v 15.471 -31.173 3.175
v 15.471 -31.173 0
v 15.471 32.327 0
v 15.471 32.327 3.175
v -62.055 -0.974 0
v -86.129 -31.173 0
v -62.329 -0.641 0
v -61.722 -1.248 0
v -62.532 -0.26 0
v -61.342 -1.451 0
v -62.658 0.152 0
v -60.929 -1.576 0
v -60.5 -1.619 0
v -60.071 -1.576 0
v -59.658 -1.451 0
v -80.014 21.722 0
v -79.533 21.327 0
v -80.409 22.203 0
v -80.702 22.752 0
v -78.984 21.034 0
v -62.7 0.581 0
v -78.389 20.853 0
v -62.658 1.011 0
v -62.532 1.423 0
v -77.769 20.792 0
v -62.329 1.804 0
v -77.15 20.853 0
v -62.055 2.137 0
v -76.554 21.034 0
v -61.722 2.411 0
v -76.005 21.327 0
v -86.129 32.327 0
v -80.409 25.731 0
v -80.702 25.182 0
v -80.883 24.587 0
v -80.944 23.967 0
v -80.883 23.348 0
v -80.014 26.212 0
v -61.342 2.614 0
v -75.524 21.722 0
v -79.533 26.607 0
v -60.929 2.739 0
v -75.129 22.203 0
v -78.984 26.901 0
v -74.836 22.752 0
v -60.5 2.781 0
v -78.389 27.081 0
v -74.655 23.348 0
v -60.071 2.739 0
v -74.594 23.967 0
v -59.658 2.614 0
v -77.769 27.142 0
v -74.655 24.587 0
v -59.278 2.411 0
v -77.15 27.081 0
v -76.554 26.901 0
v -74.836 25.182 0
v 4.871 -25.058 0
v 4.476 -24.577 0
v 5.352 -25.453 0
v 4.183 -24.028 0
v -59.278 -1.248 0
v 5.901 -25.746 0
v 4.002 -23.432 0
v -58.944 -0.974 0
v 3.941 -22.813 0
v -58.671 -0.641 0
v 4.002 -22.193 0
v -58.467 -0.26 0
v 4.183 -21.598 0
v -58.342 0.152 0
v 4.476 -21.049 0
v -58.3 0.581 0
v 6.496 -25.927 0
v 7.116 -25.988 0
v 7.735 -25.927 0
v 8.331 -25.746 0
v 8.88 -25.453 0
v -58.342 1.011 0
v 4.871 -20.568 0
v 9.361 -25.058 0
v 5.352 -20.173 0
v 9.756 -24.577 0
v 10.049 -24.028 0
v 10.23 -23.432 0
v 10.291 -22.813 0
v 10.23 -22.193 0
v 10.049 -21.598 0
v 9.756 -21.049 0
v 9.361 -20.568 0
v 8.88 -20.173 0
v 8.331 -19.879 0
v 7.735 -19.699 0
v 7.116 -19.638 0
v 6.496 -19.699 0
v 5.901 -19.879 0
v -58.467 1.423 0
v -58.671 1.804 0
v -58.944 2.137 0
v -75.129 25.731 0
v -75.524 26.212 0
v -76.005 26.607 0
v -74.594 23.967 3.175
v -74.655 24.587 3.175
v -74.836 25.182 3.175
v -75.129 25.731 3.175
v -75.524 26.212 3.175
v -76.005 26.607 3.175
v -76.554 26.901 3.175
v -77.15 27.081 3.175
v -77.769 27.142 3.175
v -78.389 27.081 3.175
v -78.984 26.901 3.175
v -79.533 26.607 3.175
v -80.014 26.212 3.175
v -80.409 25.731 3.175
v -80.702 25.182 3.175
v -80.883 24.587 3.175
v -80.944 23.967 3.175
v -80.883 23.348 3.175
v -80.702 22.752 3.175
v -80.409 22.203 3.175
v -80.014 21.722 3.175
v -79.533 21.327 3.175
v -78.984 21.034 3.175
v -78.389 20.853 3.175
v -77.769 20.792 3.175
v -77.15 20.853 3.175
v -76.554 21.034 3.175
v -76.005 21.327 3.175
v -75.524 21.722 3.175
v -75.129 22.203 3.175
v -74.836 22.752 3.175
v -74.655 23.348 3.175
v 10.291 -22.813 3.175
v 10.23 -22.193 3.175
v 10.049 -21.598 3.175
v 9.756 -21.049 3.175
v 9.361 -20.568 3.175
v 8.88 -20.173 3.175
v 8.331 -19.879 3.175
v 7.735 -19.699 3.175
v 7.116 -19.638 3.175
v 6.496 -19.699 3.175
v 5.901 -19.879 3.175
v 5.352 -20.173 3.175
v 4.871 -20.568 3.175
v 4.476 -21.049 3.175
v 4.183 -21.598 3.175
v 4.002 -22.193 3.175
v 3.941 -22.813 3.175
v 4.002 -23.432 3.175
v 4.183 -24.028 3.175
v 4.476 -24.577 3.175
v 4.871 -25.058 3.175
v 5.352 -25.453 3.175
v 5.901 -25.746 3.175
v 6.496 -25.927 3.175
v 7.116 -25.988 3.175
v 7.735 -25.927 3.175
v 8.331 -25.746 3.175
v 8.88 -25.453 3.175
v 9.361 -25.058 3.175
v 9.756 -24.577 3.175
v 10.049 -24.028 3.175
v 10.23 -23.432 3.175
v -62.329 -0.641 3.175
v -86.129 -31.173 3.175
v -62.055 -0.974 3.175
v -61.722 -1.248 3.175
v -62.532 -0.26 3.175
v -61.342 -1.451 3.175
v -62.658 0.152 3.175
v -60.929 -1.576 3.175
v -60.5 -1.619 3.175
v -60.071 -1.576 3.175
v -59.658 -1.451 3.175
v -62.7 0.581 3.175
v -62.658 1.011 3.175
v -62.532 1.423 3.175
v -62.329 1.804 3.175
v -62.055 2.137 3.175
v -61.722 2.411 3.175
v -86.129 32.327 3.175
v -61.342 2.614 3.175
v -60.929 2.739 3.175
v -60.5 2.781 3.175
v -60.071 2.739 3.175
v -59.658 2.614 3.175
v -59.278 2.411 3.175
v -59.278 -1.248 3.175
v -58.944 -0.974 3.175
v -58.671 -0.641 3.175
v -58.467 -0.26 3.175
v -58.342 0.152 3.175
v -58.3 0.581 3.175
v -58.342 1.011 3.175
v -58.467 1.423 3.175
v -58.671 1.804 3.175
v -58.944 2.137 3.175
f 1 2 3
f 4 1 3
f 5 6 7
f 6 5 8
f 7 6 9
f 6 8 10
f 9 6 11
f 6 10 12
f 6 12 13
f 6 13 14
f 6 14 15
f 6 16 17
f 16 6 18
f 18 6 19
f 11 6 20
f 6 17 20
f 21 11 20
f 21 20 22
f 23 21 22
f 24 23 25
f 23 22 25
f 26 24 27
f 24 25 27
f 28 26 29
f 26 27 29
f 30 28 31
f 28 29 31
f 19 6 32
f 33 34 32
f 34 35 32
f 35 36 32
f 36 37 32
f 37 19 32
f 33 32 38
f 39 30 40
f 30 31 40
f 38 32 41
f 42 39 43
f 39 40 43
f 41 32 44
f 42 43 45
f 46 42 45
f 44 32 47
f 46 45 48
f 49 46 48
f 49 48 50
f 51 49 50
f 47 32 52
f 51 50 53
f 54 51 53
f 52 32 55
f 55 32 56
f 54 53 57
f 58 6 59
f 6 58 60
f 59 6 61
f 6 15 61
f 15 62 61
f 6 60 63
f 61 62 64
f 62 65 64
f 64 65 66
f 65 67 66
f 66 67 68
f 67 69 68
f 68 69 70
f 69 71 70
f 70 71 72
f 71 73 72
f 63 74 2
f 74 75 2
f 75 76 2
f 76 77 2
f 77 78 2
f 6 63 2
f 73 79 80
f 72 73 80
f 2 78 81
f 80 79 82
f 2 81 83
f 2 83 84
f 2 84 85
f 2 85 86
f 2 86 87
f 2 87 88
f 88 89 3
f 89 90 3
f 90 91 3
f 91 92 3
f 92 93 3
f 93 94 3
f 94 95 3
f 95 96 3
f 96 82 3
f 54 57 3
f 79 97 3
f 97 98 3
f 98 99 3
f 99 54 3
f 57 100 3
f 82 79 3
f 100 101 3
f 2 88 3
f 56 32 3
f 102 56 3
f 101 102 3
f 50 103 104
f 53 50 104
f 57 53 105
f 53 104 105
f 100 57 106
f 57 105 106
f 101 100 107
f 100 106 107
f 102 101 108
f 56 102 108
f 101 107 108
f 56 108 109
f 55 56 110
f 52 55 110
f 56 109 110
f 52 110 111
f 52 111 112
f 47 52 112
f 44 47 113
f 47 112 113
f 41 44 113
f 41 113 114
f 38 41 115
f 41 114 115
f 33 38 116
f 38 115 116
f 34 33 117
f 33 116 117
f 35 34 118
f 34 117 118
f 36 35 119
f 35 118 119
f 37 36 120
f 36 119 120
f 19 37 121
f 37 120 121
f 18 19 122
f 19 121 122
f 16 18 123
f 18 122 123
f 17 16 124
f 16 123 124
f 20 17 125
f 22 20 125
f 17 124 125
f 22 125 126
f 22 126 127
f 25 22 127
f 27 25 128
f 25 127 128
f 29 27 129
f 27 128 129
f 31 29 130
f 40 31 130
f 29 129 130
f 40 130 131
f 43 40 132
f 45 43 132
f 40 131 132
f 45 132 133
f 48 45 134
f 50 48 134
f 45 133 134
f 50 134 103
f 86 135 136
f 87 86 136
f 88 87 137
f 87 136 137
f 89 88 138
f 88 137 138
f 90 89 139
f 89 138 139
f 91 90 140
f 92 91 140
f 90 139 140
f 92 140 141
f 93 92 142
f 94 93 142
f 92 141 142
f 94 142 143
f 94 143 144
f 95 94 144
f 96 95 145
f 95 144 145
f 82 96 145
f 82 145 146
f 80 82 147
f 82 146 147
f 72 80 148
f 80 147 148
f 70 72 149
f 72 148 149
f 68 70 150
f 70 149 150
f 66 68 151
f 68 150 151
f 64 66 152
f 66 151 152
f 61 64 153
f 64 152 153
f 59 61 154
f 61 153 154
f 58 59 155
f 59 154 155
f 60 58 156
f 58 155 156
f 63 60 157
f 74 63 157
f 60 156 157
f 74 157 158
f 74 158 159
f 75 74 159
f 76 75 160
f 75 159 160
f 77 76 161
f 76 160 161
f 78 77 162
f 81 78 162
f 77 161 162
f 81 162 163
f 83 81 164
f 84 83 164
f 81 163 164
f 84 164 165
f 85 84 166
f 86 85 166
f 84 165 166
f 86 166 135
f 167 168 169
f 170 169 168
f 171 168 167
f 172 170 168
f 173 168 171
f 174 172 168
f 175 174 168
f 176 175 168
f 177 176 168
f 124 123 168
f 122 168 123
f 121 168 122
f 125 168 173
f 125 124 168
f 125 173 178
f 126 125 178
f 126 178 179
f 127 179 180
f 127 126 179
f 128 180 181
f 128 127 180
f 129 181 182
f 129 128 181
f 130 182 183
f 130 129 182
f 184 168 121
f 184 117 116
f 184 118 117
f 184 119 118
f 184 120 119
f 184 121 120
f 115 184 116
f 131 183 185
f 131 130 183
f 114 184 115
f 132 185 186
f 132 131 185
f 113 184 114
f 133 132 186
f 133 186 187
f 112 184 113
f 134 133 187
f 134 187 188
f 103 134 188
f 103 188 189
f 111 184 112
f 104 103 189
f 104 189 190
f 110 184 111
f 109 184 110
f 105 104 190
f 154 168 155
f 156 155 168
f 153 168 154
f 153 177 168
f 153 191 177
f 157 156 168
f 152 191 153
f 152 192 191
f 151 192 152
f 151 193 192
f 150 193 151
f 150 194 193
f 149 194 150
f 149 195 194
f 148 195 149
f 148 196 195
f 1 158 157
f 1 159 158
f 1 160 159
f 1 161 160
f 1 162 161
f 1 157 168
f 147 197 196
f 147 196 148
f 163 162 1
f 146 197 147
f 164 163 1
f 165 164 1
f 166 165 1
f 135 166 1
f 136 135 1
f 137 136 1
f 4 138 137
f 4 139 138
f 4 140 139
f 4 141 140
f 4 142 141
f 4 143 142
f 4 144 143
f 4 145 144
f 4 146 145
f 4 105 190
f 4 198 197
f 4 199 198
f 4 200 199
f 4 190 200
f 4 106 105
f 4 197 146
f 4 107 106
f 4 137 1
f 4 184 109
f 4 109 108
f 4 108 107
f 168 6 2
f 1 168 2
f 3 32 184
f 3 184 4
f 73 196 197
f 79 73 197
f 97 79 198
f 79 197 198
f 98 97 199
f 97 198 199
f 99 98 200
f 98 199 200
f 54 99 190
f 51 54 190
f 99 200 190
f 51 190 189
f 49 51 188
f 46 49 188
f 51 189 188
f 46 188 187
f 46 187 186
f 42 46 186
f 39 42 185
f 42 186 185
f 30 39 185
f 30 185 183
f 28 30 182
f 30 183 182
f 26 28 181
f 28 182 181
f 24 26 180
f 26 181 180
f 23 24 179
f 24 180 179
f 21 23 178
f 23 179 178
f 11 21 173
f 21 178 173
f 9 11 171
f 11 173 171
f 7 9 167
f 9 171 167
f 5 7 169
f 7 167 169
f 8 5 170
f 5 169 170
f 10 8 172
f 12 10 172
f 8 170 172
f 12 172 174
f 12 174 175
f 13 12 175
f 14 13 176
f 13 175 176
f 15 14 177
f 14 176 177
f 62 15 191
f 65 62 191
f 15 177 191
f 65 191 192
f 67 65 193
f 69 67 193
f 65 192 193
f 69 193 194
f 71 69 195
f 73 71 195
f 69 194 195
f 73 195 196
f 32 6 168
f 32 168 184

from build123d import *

# Parameters (mm, degrees)
SKETCH1_W           = 101.6
SKETCH1_H           = 63.5
BOSS_EXTRUDE1_DEPTH = 3.175
SKETCH2_R           = 3.175
CUT_EXTRUDE1_DEPTH  = 3.175
SKETCH3_R           = 2.199978507
CUT_EXTRUDE2_DEPTH  = 3.175


with BuildPart() as part:
    # Sketch1 → Boss-Extrude1 (new body)
    with BuildSketch(Plane.XY):
        with Locations((-35.329090909, 0.577272727)):
            Rectangle(SKETCH1_W, SKETCH1_H)
    extrude(amount=BOSS_EXTRUDE1_DEPTH)

    # Sketch2 → Cut-Extrude1 (cut)
    with BuildSketch(Plane.XY.offset(3.175)):
        with Locations((-77.769090909, 23.967272727)):
            Circle(SKETCH2_R)
        with Locations((7.115909091, -22.812727273)):
            Circle(SKETCH2_R)
    extrude(amount=-CUT_EXTRUDE1_DEPTH, mode=Mode.SUBTRACT)

    # Sketch3 → Cut-Extrude2 (cut)
    with BuildSketch(Plane.XY.offset(3.175)):
        with Locations((-60.499797011, 0.581401186)):
            Circle(SKETCH3_R)
    extrude(amount=-CUT_EXTRUDE2_DEPTH, mode=Mode.SUBTRACT)


solid = part.part
